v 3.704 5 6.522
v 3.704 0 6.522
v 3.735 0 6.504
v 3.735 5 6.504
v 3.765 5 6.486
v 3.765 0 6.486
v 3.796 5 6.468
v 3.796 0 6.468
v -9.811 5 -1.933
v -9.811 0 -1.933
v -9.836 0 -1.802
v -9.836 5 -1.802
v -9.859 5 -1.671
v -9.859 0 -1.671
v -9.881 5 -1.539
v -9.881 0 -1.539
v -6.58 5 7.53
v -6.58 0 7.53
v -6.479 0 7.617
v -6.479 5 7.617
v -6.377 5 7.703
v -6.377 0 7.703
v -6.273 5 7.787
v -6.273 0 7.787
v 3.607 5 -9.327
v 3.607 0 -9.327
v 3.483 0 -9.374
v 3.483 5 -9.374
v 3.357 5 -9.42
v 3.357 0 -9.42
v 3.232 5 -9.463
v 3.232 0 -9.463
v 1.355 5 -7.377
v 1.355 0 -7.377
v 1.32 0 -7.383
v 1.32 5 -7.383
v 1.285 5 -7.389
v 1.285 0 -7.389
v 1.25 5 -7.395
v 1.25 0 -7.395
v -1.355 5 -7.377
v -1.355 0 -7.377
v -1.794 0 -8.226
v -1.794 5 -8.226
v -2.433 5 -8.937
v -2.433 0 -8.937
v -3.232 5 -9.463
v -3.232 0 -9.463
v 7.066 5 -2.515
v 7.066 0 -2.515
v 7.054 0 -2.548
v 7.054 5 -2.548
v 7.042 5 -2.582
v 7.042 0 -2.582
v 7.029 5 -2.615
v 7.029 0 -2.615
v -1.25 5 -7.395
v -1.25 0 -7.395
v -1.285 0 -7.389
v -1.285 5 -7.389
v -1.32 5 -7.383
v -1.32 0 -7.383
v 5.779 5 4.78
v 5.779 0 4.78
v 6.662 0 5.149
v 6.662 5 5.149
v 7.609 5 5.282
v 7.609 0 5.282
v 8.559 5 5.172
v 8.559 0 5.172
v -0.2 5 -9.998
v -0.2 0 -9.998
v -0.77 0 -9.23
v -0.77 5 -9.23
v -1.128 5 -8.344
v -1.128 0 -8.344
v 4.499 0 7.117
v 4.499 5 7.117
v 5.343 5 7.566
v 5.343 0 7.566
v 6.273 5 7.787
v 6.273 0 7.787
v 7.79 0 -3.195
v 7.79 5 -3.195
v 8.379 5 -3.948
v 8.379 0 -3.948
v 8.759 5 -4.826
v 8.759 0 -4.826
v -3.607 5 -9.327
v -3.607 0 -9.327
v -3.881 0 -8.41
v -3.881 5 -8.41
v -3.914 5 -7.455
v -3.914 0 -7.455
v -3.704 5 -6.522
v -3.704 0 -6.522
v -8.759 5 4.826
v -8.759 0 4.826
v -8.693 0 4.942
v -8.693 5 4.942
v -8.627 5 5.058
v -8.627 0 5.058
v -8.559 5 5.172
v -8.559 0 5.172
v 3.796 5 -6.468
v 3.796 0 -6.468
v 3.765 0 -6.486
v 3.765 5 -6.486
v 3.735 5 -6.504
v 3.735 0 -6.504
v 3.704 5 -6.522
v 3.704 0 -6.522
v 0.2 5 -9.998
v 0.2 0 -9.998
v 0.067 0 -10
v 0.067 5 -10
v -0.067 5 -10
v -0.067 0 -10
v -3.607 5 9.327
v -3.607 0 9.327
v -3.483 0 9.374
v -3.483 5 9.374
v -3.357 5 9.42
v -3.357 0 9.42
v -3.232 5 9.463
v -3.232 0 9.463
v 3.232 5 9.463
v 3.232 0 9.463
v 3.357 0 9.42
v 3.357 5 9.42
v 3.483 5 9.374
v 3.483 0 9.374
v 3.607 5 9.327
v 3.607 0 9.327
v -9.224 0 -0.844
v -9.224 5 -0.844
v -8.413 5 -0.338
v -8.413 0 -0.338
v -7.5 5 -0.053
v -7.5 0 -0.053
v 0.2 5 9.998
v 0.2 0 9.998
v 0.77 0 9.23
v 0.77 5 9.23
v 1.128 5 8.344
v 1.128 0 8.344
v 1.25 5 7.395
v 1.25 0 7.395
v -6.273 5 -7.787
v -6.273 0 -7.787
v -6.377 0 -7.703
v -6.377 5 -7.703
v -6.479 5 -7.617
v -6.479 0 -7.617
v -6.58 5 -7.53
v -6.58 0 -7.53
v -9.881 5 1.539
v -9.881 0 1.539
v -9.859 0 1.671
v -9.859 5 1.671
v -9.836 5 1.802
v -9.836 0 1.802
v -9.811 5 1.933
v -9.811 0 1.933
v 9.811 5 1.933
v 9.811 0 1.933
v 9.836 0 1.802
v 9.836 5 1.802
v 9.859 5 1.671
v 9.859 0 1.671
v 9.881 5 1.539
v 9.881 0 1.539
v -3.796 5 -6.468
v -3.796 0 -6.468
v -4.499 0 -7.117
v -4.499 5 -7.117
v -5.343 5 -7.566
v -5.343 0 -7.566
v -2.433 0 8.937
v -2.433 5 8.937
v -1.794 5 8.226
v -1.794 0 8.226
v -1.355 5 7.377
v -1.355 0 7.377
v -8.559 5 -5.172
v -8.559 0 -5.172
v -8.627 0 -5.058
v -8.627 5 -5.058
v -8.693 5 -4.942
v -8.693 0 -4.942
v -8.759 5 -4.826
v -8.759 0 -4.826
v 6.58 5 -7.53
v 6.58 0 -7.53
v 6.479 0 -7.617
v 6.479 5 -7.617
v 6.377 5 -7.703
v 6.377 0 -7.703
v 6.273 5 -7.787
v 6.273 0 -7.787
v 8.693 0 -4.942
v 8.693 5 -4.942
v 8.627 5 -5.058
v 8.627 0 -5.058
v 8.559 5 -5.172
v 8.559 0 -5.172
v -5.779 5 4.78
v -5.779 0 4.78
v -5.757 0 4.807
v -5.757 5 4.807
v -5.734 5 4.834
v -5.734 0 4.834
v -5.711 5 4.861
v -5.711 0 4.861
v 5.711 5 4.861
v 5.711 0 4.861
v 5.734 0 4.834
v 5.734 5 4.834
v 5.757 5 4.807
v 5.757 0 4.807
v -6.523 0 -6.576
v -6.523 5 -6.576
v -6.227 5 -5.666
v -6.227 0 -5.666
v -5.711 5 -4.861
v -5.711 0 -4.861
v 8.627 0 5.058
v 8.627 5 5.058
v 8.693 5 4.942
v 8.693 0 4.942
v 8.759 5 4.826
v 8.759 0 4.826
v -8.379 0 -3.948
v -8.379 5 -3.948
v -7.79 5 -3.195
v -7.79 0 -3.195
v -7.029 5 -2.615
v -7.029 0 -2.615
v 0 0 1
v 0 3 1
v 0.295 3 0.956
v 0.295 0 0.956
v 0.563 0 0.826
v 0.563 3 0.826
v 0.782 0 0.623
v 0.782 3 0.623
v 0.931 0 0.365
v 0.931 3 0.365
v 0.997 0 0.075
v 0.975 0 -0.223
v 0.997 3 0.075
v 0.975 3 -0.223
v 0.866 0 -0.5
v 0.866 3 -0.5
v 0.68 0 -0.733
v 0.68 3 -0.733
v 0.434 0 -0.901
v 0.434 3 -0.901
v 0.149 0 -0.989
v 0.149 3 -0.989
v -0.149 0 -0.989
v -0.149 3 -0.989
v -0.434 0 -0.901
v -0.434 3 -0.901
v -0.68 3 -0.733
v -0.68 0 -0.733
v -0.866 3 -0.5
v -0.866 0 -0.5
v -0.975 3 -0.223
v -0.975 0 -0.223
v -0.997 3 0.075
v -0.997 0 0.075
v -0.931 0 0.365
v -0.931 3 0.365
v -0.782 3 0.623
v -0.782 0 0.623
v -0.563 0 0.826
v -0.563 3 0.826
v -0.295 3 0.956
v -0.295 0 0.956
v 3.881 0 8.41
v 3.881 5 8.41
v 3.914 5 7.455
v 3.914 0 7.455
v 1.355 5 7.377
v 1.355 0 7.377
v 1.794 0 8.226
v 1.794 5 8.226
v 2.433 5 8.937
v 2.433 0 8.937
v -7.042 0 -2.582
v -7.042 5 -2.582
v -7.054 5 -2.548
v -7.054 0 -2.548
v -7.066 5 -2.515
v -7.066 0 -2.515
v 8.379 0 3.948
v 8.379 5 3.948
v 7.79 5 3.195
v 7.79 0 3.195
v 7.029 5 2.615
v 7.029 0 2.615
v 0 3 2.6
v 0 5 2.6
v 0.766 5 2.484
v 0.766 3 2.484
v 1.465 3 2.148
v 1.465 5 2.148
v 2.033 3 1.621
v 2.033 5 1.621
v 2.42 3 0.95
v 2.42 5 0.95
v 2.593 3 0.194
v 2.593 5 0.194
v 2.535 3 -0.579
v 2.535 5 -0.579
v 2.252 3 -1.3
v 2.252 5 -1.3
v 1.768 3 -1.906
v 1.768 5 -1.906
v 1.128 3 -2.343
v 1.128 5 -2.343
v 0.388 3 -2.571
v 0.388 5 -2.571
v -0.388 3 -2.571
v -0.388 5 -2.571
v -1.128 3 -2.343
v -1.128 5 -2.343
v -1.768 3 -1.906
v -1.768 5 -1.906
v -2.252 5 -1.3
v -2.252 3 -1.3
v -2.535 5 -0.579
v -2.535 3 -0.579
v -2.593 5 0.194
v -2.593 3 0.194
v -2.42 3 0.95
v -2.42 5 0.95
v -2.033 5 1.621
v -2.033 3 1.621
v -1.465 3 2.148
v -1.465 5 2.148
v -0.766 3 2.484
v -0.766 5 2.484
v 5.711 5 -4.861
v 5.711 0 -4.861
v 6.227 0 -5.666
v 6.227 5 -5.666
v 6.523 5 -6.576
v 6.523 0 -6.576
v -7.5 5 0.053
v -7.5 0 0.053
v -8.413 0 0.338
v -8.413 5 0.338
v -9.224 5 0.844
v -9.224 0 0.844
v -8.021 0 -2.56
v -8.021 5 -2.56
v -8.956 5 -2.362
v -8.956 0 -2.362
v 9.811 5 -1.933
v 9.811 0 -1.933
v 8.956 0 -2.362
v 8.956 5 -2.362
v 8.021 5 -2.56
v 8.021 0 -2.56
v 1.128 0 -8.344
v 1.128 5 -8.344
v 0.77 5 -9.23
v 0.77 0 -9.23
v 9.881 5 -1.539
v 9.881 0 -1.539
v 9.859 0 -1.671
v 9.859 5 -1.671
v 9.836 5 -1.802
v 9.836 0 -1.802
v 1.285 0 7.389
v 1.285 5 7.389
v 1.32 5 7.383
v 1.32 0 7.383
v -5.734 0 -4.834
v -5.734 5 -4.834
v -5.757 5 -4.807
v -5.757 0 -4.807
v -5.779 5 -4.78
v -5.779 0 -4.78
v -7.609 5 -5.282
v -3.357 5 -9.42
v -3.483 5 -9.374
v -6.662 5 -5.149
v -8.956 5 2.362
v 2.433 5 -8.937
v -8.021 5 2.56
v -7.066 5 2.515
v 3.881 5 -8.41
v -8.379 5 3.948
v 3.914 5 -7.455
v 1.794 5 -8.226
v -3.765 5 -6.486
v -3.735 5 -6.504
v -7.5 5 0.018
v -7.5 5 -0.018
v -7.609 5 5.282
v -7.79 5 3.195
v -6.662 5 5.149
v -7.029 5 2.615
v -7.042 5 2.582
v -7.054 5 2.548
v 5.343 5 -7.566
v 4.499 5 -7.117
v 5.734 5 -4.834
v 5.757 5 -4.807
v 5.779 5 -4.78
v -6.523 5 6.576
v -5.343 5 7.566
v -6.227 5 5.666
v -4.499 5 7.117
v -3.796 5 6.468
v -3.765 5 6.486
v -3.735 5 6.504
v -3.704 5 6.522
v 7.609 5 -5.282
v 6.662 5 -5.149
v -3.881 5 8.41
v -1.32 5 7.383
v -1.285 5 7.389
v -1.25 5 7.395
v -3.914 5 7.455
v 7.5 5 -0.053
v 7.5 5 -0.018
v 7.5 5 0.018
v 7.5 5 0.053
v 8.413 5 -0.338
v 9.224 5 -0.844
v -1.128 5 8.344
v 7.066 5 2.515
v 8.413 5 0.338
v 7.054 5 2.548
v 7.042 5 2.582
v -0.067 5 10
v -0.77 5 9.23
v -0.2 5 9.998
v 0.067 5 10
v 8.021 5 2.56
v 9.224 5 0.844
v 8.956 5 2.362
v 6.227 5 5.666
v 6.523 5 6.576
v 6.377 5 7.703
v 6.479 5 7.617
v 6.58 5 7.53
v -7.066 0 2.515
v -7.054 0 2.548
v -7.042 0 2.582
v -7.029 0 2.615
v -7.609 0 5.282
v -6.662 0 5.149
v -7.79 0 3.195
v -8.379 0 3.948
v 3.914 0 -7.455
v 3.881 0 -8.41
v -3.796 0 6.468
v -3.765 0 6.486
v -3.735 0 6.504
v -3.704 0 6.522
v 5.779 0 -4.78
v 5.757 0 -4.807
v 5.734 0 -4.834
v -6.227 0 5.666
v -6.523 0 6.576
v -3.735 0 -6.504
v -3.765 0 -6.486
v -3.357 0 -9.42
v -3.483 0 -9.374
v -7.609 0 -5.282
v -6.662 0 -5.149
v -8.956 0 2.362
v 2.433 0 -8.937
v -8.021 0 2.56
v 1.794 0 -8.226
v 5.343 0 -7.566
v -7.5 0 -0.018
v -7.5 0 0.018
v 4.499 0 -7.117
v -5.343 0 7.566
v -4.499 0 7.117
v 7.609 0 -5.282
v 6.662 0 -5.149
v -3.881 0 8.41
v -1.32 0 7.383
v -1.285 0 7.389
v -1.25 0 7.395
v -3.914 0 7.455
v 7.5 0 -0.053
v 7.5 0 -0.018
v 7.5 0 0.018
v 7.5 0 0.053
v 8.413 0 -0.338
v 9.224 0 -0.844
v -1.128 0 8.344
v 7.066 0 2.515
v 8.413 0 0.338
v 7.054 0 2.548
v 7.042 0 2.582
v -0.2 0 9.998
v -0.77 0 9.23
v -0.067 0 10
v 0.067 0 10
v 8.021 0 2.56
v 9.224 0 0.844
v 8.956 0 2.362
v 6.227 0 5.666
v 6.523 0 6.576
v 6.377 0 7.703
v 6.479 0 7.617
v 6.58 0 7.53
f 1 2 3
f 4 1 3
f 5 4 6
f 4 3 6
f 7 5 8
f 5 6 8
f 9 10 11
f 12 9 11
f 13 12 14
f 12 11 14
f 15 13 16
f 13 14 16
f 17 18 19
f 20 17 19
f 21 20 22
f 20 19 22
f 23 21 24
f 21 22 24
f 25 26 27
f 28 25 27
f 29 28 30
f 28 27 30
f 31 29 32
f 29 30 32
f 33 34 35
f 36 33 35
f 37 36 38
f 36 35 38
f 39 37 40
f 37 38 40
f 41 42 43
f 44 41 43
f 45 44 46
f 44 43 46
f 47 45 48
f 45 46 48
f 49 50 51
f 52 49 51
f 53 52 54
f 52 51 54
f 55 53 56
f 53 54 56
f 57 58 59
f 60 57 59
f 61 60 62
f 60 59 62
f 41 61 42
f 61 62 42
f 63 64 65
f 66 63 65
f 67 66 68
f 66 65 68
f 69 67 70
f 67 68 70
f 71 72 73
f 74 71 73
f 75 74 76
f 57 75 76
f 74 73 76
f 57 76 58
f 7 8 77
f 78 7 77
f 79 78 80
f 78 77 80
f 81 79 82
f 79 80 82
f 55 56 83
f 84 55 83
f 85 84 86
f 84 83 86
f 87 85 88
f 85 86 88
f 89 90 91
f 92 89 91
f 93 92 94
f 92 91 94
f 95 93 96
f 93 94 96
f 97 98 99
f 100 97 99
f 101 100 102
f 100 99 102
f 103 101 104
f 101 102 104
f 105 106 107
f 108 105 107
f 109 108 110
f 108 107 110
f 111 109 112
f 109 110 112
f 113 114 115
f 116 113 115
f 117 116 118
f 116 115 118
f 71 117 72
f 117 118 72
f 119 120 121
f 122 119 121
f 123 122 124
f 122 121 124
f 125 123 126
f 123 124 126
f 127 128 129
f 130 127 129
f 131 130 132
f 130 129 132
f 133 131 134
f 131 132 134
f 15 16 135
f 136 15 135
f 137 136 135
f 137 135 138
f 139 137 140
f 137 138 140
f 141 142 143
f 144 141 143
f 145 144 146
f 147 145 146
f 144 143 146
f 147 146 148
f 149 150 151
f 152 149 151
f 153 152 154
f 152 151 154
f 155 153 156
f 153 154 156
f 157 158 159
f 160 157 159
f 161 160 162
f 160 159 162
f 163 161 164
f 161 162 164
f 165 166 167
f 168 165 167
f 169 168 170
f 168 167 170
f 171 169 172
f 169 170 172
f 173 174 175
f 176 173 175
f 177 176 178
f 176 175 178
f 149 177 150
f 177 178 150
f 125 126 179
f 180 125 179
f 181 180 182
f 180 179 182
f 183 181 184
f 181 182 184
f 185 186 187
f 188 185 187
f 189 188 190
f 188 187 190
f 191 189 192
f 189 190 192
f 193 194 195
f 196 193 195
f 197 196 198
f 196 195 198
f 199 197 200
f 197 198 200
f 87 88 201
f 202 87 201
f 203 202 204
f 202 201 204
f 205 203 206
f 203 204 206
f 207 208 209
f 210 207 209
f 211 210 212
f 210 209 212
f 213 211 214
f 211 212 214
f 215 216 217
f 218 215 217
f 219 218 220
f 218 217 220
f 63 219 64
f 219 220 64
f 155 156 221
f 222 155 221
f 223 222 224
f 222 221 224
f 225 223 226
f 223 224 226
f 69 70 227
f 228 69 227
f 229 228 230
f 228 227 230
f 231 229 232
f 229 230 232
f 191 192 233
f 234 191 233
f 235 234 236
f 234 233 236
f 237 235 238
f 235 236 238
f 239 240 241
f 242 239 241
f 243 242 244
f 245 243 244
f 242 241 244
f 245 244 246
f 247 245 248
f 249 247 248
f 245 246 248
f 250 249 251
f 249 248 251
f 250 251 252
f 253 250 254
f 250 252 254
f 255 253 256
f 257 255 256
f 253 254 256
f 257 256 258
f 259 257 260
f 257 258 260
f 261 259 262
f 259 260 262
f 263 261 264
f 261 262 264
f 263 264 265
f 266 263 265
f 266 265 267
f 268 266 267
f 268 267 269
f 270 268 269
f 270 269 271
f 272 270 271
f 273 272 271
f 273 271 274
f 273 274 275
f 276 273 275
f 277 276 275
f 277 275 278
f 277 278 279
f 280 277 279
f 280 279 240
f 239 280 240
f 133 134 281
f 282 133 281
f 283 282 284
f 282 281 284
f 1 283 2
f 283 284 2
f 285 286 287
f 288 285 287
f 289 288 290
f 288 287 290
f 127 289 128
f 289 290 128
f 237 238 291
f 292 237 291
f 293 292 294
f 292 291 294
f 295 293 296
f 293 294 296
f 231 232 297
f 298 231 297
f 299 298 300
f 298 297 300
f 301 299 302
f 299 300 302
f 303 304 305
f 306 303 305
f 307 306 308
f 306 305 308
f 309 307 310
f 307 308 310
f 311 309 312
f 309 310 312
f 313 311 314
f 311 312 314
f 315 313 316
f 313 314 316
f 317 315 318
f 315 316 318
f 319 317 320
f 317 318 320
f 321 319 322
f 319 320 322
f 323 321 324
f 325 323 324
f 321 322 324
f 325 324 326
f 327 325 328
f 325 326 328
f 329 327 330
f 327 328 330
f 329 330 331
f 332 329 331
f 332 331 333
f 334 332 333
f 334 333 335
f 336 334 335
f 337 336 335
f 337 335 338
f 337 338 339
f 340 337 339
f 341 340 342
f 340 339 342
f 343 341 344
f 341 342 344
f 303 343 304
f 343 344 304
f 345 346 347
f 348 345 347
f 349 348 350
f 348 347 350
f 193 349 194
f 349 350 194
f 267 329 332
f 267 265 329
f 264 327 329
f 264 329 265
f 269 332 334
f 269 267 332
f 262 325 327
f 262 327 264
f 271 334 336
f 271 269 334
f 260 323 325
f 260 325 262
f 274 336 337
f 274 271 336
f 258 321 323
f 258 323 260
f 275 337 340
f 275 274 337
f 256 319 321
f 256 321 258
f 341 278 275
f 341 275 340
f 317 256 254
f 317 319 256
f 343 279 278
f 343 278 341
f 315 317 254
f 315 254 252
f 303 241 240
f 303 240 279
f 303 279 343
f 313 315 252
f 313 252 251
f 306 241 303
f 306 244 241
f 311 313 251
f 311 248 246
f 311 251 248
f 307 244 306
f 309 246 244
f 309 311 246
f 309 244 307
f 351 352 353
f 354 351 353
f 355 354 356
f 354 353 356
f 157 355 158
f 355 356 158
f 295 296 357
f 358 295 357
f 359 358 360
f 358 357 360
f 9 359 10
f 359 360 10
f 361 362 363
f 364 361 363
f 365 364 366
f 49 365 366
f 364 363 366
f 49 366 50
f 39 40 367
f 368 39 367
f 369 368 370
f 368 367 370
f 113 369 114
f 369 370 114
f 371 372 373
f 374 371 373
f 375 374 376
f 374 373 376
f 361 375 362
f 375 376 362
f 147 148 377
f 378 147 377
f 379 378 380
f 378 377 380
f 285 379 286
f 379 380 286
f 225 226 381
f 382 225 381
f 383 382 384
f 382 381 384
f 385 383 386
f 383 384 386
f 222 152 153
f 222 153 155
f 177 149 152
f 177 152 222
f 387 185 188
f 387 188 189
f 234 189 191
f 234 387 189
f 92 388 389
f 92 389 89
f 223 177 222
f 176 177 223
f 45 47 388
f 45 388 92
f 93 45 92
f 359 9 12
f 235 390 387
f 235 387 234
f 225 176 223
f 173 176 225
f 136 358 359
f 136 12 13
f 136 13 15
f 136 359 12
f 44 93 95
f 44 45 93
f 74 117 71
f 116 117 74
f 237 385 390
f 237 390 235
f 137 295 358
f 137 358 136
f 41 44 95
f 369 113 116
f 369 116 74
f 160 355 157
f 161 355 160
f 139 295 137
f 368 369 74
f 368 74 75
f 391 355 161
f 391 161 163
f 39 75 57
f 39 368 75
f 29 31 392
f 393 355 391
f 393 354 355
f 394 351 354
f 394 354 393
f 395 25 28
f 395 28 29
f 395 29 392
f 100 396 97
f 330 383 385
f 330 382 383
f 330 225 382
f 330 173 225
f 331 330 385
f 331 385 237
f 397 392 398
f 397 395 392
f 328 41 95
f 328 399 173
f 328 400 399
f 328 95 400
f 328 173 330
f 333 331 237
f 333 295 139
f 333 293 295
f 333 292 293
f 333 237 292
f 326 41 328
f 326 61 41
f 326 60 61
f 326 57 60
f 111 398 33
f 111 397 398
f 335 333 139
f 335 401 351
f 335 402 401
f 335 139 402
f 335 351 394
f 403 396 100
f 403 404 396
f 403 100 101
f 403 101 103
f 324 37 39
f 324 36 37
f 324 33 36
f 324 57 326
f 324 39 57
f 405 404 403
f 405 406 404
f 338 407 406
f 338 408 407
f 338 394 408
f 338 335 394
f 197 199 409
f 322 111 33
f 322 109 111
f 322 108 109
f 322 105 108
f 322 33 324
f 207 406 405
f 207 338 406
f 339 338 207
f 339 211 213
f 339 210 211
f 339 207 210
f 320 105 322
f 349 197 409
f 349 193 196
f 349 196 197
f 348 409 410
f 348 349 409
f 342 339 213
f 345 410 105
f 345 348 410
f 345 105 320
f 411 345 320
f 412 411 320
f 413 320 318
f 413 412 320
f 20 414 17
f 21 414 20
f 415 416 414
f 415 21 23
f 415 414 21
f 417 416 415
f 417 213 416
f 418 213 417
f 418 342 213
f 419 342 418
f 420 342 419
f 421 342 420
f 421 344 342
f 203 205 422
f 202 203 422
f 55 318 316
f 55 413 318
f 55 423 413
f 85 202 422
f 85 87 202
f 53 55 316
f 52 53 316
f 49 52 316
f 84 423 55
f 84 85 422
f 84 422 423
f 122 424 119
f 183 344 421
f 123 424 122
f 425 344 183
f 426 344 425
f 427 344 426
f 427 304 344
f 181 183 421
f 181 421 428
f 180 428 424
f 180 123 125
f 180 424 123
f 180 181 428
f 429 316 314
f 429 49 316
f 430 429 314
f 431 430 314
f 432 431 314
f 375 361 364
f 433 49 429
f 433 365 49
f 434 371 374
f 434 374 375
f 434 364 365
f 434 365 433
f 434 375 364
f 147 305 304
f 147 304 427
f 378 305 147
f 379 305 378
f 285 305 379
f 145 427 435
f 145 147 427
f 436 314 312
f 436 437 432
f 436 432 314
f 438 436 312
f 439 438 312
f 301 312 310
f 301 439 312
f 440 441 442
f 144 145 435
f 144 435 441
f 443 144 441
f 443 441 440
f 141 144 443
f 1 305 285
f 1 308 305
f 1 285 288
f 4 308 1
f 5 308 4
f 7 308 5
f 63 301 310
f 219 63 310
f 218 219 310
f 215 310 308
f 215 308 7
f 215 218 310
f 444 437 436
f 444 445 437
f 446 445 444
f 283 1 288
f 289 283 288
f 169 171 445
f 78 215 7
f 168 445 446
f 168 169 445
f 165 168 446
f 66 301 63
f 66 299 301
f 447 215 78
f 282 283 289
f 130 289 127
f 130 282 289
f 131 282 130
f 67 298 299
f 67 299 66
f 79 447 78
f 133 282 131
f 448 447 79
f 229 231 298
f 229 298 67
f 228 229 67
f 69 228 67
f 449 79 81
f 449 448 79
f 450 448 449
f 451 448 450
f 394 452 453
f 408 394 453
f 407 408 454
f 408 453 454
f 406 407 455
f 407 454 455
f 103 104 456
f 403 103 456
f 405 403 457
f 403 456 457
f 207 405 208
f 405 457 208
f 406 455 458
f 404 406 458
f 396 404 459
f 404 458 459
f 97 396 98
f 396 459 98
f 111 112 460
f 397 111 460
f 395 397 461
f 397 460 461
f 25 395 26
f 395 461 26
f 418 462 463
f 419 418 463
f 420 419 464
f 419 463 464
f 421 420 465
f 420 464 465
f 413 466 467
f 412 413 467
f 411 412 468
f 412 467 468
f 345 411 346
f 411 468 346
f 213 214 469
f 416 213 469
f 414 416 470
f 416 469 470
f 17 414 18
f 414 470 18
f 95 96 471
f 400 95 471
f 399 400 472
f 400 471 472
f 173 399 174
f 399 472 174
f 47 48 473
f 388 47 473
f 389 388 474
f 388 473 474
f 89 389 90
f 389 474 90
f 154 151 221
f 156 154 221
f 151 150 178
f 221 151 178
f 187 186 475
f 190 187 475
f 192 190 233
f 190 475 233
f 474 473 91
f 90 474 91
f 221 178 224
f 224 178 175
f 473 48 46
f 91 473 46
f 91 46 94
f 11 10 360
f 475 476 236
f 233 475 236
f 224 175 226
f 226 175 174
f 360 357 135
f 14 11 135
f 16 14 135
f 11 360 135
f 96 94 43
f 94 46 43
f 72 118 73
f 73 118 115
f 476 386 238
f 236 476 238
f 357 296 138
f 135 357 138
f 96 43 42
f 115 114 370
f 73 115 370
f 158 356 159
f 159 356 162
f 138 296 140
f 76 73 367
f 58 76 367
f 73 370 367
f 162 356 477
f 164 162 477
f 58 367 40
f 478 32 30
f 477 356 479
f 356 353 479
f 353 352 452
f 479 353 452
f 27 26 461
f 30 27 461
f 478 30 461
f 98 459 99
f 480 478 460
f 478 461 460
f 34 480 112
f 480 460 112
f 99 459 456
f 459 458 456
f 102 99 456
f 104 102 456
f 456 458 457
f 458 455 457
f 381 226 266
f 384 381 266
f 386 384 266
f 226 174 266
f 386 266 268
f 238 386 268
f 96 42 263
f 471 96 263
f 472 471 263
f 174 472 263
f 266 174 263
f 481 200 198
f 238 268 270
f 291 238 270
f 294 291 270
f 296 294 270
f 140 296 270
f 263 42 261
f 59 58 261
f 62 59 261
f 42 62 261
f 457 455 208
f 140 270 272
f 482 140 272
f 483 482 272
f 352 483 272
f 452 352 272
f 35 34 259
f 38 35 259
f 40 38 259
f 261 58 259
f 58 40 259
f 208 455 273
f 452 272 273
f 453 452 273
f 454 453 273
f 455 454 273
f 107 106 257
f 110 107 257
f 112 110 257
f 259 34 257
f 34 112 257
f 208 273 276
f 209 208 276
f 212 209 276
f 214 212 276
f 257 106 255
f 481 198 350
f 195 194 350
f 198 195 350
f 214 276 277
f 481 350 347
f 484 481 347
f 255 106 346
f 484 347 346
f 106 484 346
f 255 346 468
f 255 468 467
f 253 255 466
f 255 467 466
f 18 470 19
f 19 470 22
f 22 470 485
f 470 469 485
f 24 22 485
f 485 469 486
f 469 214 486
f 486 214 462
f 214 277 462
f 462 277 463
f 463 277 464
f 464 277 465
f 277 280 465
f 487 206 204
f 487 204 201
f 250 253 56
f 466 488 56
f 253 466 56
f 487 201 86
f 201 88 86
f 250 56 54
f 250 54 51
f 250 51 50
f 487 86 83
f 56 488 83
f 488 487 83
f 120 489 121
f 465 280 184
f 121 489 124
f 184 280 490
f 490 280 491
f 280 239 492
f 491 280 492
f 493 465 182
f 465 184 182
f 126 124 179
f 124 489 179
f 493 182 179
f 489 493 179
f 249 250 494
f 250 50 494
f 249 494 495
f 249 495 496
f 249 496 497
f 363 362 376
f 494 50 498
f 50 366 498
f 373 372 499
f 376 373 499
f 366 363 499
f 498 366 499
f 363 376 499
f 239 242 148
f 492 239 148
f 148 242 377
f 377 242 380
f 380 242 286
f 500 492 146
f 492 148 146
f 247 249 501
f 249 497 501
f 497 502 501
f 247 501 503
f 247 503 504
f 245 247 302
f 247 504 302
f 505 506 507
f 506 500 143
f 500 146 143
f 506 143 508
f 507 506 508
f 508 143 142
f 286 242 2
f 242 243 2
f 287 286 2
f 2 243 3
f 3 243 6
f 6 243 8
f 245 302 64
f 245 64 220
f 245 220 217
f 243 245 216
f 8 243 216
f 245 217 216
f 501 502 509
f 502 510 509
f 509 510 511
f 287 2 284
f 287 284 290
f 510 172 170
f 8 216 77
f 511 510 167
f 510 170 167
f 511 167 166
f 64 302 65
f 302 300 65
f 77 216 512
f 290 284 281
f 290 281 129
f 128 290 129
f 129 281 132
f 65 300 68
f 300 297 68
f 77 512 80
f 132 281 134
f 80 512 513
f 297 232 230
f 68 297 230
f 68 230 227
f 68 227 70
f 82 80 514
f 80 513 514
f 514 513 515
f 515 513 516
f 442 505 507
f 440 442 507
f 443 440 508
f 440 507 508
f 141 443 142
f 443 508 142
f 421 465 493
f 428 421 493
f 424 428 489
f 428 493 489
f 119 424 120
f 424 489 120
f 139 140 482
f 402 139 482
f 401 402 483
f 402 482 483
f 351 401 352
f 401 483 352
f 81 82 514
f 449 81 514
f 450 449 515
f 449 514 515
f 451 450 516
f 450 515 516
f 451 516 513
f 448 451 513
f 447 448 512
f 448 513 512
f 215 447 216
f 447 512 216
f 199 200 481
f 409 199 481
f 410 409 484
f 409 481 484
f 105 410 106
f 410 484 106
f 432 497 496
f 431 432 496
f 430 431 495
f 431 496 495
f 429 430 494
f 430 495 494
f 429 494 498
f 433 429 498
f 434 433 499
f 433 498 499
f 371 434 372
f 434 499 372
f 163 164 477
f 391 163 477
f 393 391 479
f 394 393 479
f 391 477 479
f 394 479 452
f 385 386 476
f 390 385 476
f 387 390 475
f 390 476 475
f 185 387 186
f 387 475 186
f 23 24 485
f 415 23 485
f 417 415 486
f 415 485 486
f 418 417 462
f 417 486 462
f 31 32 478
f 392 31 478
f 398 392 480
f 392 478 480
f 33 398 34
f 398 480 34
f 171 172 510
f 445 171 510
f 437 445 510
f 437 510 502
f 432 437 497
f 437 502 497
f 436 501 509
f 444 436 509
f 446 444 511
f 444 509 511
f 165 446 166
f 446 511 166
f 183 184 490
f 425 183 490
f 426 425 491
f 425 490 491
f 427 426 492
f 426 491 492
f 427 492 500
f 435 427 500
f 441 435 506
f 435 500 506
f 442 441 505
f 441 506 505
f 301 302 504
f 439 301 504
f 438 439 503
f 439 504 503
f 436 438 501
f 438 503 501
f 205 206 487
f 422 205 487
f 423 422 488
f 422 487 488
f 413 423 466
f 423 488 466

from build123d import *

# Parameters (mm, degrees)
SKETCH1_R           = 7.5
BOSS_EXTRUDE1_DEPTH = 5
SKETCH2_R           = 1
CUT_EXTRUDE1_DEPTH  = 10
SKETCH3_R           = 2.6
CUT_EXTRUDE2_DEPTH  = 2
BOSS_EXTRUDE3_DEPTH = 5
CIRPATTERN1_DEPTH   = 5


# Read off the part's stored shape, not the designer's step: CirPattern1
with BuildPart() as part:
    # Sketch1 → Boss-Extrude1 (new body)
    with BuildSketch(Plane(origin=(0, 0, 0), x_dir=(1, 0, 0), z_dir=(0, 1, 0))):
        with Locations(Location((0, 0, 0), (0, 0, 270))):
            Circle(SKETCH1_R)
    extrude(amount=BOSS_EXTRUDE1_DEPTH)

    # Sketch2 → Cut-Extrude1 (cut)
    with BuildSketch(Plane(origin=(0, 5, 0), x_dir=(1, 0, 0), z_dir=(0, 1, 0))):
        with Locations(Location((0, 0, 0), (0, 0, 270))):
            Circle(SKETCH2_R)
    extrude(amount=-CUT_EXTRUDE1_DEPTH, mode=Mode.SUBTRACT)

    # Sketch3 → Cut-Extrude2 (cut)
    with BuildSketch(Plane(origin=(0, 5, 0), x_dir=(1, 0, 0), z_dir=(0, 1, 0))):
        with Locations(Location((0, 0, 0), (0, 0, 270))):
            Circle(SKETCH3_R)
    extrude(amount=-CUT_EXTRUDE2_DEPTH, mode=Mode.SUBTRACT)

    # Sketch6 → Boss-Extrude3 (add)
    with BuildSketch(Plane(origin=(0, 0, 0), x_dir=(1, 0, 0), z_dir=(0, 1, 0))):
        with BuildLine():
            ThreePointArc((0.2, 9.9979998), (0, 10), (-0.2, 9.9979998))
            ThreePointArc((-0.2, 9.9979998), (-0.977699989, 8.79848798), (-1.25, 7.395099729))
            ThreePointArc((-1.25, 7.395099729), (0, 7.5), (1.25, 7.395099729))
            ThreePointArc((1.25, 7.395099729), (0.977699989, 8.79848798), (0.2, 9.9979998))
        make_face()
    extrude(amount=BOSS_EXTRUDE3_DEPTH)

    # CirPattern1 outline → CirPattern1 (add)
    with BuildSketch(Plane(origin=(0, 0, 0), x_dir=(1, 0, 0), z_dir=(0, 1, 0))):
        with BuildLine():
            ThreePointArc((-3.607455849, 9.326642606), (-3.927997585, 7.933481138), (-3.703888845, 6.521595466))
            ThreePointArc((-3.703888845, 6.521595466), (-2.565151075, 7.047694656), (-1.354657293, 7.376645825))
            ThreePointArc((-1.354657293, 7.376645825), (-2.090522655, 8.602267319), (-3.2315788, 9.463450663))
            ThreePointArc((-3.2315788, 9.463450663), (-3.420201433, 9.396926208), (-3.607455849, 9.326642606))
        make_face()
        with BuildLine():
            ThreePointArc((-6.579799282, 7.530354667), (-6.404520701, 6.111579386), (-5.711034032, 4.861490542))
            ThreePointArc((-5.711034032, 4.861490542), (-4.820907072, 5.745333324), (-3.795922924, 6.468459566))
            ThreePointArc((-3.795922924, 6.468459566), (-4.906597414, 7.368486264), (-6.273381504, 7.787469711))
            ThreePointArc((-6.273381504, 7.787469711), (-6.427876097, 7.660444431), (-6.579799282, 7.530354667))
        make_face()
        with BuildLine():
            ThreePointArc((-8.758521814, 4.825794819), (-8.1085641, 3.552530962), (-7.029344229, 2.61501811))
            ThreePointArc((-7.029344229, 2.61501811), (-6.495190528, 3.75), (-5.779344229, 4.780081619))
            ThreePointArc((-5.779344229, 4.780081619), (-7.130864111, 5.245957017), (-8.558521814, 5.172204981))
            ThreePointArc((-8.558521814, 5.172204981), (-8.660254038, 5), (-8.758521814, 4.825794819))
        make_face()
        with BuildLine():
            ThreePointArc((-9.880837353, 1.539172895), (-8.834594998, 0.564994875), (-7.499811769, 0.0531359))
            ThreePointArc((-7.499811769, 0.0531359), (-7.386058148, 1.302361332), (-7.065691325, 2.515155283))
            ThreePointArc((-7.065691325, 2.515155283), (-8.495043356, 2.490687933), (-9.811378082, 1.933095996))
            ThreePointArc((-9.811378082, 1.933095996), (-9.84807753, 1.736481777), (-9.880837353, 1.539172895))
        make_face()
        with BuildLine():
            ThreePointArc((-9.811378082, -1.933095996), (-8.495043356, -2.490687933), (-7.065691325, -2.515155283))
            ThreePointArc((-7.065691325, -2.515155283), (-7.386058148, -1.302361332), (-7.499811769, -0.0531359))
            ThreePointArc((-7.499811769, -0.0531359), (-8.834594998, -0.564994875), (-9.880837353, -1.539172895))
            ThreePointArc((-9.880837353, -1.539172895), (-9.84807753, -1.736481777), (-9.811378082, -1.933095996))
        make_face()
        with BuildLine():
            ThreePointArc((-8.558521814, -5.172204981), (-7.130864111, -5.245957017), (-5.779344229, -4.780081619))
            ThreePointArc((-5.779344229, -4.780081619), (-6.495190528, -3.75), (-7.029344229, -2.61501811))
            ThreePointArc((-7.029344229, -2.61501811), (-8.1085641, -3.552530962), (-8.758521814, -4.825794819))
            ThreePointArc((-8.758521814, -4.825794819), (-8.660254038, -5), (-8.558521814, -5.172204981))
        make_face()
        with BuildLine():
            ThreePointArc((-6.273381504, -7.787469711), (-4.906597414, -7.368486264), (-3.795922924, -6.468459566))
            ThreePointArc((-3.795922924, -6.468459566), (-4.820907072, -5.745333324), (-5.711034032, -4.861490542))
            ThreePointArc((-5.711034032, -4.861490542), (-6.404520701, -6.111579386), (-6.579799282, -7.530354667))
            ThreePointArc((-6.579799282, -7.530354667), (-6.427876097, -7.660444431), (-6.273381504, -7.787469711))
        make_face()
        with BuildLine():
            ThreePointArc((-3.2315788, -9.463450663), (-2.090522655, -8.602267319), (-1.354657293, -7.376645824))
            ThreePointArc((-1.354657293, -7.376645824), (-2.565151075, -7.047694656), (-3.703888845, -6.521595466))
            ThreePointArc((-3.703888845, -6.521595466), (-3.927997585, -7.933481138), (-3.607455849, -9.326642606))
            ThreePointArc((-3.607455849, -9.326642606), (-3.420201433, -9.396926208), (-3.2315788, -9.463450663))
        make_face()
        with BuildLine():
            ThreePointArc((0.2, -9.9979998), (0.977699989, -8.79848798), (1.25, -7.395099729))
            ThreePointArc((1.25, -7.395099729), (0, -7.5), (-1.25, -7.395099729))
            ThreePointArc((-1.25, -7.395099729), (-0.977699989, -8.79848798), (-0.2, -9.9979998))
            ThreePointArc((-0.2, -9.9979998), (0, -10), (0.2, -9.9979998))
        make_face()
        with BuildLine():
            ThreePointArc((3.607455849, -9.326642606), (3.927997585, -7.933481138), (3.703888845, -6.521595466))
            ThreePointArc((3.703888845, -6.521595466), (2.565151075, -7.047694656), (1.354657293, -7.376645824))
            ThreePointArc((1.354657293, -7.376645824), (2.090522655, -8.602267319), (3.2315788, -9.463450663))
            ThreePointArc((3.2315788, -9.463450663), (3.420201433, -9.396926208), (3.607455849, -9.326642606))
        make_face()
        with BuildLine():
            ThreePointArc((6.579799282, -7.530354667), (6.404520701, -6.111579386), (5.711034032, -4.861490542))
            ThreePointArc((5.711034032, -4.861490542), (4.820907072, -5.745333324), (3.795922924, -6.468459566))
            ThreePointArc((3.795922924, -6.468459566), (4.906597414, -7.368486264), (6.273381504, -7.787469711))
            ThreePointArc((6.273381504, -7.787469711), (6.427876097, -7.660444431), (6.579799282, -7.530354667))
        make_face()
        with BuildLine():
            ThreePointArc((8.758521814, -4.825794819), (8.1085641, -3.552530962), (7.029344229, -2.61501811))
            ThreePointArc((7.029344229, -2.61501811), (6.495190528, -3.75), (5.779344229, -4.780081619))
            ThreePointArc((5.779344229, -4.780081619), (7.130864111, -5.245957017), (8.558521814, -5.172204981))
            ThreePointArc((8.558521814, -5.172204981), (8.660254038, -5), (8.758521814, -4.825794819))
        make_face()
        with BuildLine():
            ThreePointArc((1.354657293, 7.376645825), (2.565151075, 7.047694656), (3.703888845, 6.521595466))
            ThreePointArc((3.703888845, 6.521595466), (3.927997585, 7.933481138), (3.607455849, 9.326642606))
            ThreePointArc((3.607455849, 9.326642606), (3.420201433, 9.396926208), (3.2315788, 9.463450663))
            ThreePointArc((3.2315788, 9.463450663), (2.090522655, 8.602267319), (1.354657293, 7.376645825))
        make_face()
        with BuildLine():
            ThreePointArc((3.795922924, 6.468459566), (4.820907072, 5.745333324), (5.711034032, 4.861490542))
            ThreePointArc((5.711034032, 4.861490542), (6.404520701, 6.111579386), (6.579799282, 7.530354667))
            ThreePointArc((6.579799282, 7.530354667), (6.427876097, 7.660444431), (6.273381504, 7.787469711))
            ThreePointArc((6.273381504, 7.787469711), (4.906597414, 7.368486264), (3.795922924, 6.468459566))
        make_face()
        with BuildLine():
            ThreePointArc((5.779344229, 4.780081619), (6.495190528, 3.75), (7.029344229, 2.61501811))
            ThreePointArc((7.029344229, 2.61501811), (8.1085641, 3.552530962), (8.758521814, 4.825794819))
            ThreePointArc((8.758521814, 4.825794819), (8.660254038, 5), (8.558521814, 5.172204981))
            ThreePointArc((8.558521814, 5.172204981), (7.130864111, 5.245957017), (5.779344229, 4.780081619))
        make_face()
        with BuildLine():
            ThreePointArc((7.065691325, 2.515155283), (7.386058148, 1.302361332), (7.499811769, 0.0531359))
            ThreePointArc((7.499811769, 0.0531359), (8.834594998, 0.564994875), (9.880837353, 1.539172895))
            ThreePointArc((9.880837353, 1.539172895), (9.84807753, 1.736481777), (9.811378082, 1.933095996))
            ThreePointArc((9.811378082, 1.933095996), (8.495043356, 2.490687933), (7.065691325, 2.515155283))
        make_face()
        with BuildLine():
            ThreePointArc((9.811378082, -1.933095996), (9.84807753, -1.736481777), (9.880837353, -1.539172895))
            ThreePointArc((9.880837353, -1.539172895), (8.834594998, -0.564994875), (7.499811769, -0.0531359))
            ThreePointArc((7.499811769, -0.0531359), (7.386058148, -1.302361332), (7.065691325, -2.515155283))
            ThreePointArc((7.065691325, -2.515155283), (8.495043356, -2.490687933), (9.811378082, -1.933095996))
        make_face()
    extrude(amount=CIRPATTERN1_DEPTH)


solid = part.part
